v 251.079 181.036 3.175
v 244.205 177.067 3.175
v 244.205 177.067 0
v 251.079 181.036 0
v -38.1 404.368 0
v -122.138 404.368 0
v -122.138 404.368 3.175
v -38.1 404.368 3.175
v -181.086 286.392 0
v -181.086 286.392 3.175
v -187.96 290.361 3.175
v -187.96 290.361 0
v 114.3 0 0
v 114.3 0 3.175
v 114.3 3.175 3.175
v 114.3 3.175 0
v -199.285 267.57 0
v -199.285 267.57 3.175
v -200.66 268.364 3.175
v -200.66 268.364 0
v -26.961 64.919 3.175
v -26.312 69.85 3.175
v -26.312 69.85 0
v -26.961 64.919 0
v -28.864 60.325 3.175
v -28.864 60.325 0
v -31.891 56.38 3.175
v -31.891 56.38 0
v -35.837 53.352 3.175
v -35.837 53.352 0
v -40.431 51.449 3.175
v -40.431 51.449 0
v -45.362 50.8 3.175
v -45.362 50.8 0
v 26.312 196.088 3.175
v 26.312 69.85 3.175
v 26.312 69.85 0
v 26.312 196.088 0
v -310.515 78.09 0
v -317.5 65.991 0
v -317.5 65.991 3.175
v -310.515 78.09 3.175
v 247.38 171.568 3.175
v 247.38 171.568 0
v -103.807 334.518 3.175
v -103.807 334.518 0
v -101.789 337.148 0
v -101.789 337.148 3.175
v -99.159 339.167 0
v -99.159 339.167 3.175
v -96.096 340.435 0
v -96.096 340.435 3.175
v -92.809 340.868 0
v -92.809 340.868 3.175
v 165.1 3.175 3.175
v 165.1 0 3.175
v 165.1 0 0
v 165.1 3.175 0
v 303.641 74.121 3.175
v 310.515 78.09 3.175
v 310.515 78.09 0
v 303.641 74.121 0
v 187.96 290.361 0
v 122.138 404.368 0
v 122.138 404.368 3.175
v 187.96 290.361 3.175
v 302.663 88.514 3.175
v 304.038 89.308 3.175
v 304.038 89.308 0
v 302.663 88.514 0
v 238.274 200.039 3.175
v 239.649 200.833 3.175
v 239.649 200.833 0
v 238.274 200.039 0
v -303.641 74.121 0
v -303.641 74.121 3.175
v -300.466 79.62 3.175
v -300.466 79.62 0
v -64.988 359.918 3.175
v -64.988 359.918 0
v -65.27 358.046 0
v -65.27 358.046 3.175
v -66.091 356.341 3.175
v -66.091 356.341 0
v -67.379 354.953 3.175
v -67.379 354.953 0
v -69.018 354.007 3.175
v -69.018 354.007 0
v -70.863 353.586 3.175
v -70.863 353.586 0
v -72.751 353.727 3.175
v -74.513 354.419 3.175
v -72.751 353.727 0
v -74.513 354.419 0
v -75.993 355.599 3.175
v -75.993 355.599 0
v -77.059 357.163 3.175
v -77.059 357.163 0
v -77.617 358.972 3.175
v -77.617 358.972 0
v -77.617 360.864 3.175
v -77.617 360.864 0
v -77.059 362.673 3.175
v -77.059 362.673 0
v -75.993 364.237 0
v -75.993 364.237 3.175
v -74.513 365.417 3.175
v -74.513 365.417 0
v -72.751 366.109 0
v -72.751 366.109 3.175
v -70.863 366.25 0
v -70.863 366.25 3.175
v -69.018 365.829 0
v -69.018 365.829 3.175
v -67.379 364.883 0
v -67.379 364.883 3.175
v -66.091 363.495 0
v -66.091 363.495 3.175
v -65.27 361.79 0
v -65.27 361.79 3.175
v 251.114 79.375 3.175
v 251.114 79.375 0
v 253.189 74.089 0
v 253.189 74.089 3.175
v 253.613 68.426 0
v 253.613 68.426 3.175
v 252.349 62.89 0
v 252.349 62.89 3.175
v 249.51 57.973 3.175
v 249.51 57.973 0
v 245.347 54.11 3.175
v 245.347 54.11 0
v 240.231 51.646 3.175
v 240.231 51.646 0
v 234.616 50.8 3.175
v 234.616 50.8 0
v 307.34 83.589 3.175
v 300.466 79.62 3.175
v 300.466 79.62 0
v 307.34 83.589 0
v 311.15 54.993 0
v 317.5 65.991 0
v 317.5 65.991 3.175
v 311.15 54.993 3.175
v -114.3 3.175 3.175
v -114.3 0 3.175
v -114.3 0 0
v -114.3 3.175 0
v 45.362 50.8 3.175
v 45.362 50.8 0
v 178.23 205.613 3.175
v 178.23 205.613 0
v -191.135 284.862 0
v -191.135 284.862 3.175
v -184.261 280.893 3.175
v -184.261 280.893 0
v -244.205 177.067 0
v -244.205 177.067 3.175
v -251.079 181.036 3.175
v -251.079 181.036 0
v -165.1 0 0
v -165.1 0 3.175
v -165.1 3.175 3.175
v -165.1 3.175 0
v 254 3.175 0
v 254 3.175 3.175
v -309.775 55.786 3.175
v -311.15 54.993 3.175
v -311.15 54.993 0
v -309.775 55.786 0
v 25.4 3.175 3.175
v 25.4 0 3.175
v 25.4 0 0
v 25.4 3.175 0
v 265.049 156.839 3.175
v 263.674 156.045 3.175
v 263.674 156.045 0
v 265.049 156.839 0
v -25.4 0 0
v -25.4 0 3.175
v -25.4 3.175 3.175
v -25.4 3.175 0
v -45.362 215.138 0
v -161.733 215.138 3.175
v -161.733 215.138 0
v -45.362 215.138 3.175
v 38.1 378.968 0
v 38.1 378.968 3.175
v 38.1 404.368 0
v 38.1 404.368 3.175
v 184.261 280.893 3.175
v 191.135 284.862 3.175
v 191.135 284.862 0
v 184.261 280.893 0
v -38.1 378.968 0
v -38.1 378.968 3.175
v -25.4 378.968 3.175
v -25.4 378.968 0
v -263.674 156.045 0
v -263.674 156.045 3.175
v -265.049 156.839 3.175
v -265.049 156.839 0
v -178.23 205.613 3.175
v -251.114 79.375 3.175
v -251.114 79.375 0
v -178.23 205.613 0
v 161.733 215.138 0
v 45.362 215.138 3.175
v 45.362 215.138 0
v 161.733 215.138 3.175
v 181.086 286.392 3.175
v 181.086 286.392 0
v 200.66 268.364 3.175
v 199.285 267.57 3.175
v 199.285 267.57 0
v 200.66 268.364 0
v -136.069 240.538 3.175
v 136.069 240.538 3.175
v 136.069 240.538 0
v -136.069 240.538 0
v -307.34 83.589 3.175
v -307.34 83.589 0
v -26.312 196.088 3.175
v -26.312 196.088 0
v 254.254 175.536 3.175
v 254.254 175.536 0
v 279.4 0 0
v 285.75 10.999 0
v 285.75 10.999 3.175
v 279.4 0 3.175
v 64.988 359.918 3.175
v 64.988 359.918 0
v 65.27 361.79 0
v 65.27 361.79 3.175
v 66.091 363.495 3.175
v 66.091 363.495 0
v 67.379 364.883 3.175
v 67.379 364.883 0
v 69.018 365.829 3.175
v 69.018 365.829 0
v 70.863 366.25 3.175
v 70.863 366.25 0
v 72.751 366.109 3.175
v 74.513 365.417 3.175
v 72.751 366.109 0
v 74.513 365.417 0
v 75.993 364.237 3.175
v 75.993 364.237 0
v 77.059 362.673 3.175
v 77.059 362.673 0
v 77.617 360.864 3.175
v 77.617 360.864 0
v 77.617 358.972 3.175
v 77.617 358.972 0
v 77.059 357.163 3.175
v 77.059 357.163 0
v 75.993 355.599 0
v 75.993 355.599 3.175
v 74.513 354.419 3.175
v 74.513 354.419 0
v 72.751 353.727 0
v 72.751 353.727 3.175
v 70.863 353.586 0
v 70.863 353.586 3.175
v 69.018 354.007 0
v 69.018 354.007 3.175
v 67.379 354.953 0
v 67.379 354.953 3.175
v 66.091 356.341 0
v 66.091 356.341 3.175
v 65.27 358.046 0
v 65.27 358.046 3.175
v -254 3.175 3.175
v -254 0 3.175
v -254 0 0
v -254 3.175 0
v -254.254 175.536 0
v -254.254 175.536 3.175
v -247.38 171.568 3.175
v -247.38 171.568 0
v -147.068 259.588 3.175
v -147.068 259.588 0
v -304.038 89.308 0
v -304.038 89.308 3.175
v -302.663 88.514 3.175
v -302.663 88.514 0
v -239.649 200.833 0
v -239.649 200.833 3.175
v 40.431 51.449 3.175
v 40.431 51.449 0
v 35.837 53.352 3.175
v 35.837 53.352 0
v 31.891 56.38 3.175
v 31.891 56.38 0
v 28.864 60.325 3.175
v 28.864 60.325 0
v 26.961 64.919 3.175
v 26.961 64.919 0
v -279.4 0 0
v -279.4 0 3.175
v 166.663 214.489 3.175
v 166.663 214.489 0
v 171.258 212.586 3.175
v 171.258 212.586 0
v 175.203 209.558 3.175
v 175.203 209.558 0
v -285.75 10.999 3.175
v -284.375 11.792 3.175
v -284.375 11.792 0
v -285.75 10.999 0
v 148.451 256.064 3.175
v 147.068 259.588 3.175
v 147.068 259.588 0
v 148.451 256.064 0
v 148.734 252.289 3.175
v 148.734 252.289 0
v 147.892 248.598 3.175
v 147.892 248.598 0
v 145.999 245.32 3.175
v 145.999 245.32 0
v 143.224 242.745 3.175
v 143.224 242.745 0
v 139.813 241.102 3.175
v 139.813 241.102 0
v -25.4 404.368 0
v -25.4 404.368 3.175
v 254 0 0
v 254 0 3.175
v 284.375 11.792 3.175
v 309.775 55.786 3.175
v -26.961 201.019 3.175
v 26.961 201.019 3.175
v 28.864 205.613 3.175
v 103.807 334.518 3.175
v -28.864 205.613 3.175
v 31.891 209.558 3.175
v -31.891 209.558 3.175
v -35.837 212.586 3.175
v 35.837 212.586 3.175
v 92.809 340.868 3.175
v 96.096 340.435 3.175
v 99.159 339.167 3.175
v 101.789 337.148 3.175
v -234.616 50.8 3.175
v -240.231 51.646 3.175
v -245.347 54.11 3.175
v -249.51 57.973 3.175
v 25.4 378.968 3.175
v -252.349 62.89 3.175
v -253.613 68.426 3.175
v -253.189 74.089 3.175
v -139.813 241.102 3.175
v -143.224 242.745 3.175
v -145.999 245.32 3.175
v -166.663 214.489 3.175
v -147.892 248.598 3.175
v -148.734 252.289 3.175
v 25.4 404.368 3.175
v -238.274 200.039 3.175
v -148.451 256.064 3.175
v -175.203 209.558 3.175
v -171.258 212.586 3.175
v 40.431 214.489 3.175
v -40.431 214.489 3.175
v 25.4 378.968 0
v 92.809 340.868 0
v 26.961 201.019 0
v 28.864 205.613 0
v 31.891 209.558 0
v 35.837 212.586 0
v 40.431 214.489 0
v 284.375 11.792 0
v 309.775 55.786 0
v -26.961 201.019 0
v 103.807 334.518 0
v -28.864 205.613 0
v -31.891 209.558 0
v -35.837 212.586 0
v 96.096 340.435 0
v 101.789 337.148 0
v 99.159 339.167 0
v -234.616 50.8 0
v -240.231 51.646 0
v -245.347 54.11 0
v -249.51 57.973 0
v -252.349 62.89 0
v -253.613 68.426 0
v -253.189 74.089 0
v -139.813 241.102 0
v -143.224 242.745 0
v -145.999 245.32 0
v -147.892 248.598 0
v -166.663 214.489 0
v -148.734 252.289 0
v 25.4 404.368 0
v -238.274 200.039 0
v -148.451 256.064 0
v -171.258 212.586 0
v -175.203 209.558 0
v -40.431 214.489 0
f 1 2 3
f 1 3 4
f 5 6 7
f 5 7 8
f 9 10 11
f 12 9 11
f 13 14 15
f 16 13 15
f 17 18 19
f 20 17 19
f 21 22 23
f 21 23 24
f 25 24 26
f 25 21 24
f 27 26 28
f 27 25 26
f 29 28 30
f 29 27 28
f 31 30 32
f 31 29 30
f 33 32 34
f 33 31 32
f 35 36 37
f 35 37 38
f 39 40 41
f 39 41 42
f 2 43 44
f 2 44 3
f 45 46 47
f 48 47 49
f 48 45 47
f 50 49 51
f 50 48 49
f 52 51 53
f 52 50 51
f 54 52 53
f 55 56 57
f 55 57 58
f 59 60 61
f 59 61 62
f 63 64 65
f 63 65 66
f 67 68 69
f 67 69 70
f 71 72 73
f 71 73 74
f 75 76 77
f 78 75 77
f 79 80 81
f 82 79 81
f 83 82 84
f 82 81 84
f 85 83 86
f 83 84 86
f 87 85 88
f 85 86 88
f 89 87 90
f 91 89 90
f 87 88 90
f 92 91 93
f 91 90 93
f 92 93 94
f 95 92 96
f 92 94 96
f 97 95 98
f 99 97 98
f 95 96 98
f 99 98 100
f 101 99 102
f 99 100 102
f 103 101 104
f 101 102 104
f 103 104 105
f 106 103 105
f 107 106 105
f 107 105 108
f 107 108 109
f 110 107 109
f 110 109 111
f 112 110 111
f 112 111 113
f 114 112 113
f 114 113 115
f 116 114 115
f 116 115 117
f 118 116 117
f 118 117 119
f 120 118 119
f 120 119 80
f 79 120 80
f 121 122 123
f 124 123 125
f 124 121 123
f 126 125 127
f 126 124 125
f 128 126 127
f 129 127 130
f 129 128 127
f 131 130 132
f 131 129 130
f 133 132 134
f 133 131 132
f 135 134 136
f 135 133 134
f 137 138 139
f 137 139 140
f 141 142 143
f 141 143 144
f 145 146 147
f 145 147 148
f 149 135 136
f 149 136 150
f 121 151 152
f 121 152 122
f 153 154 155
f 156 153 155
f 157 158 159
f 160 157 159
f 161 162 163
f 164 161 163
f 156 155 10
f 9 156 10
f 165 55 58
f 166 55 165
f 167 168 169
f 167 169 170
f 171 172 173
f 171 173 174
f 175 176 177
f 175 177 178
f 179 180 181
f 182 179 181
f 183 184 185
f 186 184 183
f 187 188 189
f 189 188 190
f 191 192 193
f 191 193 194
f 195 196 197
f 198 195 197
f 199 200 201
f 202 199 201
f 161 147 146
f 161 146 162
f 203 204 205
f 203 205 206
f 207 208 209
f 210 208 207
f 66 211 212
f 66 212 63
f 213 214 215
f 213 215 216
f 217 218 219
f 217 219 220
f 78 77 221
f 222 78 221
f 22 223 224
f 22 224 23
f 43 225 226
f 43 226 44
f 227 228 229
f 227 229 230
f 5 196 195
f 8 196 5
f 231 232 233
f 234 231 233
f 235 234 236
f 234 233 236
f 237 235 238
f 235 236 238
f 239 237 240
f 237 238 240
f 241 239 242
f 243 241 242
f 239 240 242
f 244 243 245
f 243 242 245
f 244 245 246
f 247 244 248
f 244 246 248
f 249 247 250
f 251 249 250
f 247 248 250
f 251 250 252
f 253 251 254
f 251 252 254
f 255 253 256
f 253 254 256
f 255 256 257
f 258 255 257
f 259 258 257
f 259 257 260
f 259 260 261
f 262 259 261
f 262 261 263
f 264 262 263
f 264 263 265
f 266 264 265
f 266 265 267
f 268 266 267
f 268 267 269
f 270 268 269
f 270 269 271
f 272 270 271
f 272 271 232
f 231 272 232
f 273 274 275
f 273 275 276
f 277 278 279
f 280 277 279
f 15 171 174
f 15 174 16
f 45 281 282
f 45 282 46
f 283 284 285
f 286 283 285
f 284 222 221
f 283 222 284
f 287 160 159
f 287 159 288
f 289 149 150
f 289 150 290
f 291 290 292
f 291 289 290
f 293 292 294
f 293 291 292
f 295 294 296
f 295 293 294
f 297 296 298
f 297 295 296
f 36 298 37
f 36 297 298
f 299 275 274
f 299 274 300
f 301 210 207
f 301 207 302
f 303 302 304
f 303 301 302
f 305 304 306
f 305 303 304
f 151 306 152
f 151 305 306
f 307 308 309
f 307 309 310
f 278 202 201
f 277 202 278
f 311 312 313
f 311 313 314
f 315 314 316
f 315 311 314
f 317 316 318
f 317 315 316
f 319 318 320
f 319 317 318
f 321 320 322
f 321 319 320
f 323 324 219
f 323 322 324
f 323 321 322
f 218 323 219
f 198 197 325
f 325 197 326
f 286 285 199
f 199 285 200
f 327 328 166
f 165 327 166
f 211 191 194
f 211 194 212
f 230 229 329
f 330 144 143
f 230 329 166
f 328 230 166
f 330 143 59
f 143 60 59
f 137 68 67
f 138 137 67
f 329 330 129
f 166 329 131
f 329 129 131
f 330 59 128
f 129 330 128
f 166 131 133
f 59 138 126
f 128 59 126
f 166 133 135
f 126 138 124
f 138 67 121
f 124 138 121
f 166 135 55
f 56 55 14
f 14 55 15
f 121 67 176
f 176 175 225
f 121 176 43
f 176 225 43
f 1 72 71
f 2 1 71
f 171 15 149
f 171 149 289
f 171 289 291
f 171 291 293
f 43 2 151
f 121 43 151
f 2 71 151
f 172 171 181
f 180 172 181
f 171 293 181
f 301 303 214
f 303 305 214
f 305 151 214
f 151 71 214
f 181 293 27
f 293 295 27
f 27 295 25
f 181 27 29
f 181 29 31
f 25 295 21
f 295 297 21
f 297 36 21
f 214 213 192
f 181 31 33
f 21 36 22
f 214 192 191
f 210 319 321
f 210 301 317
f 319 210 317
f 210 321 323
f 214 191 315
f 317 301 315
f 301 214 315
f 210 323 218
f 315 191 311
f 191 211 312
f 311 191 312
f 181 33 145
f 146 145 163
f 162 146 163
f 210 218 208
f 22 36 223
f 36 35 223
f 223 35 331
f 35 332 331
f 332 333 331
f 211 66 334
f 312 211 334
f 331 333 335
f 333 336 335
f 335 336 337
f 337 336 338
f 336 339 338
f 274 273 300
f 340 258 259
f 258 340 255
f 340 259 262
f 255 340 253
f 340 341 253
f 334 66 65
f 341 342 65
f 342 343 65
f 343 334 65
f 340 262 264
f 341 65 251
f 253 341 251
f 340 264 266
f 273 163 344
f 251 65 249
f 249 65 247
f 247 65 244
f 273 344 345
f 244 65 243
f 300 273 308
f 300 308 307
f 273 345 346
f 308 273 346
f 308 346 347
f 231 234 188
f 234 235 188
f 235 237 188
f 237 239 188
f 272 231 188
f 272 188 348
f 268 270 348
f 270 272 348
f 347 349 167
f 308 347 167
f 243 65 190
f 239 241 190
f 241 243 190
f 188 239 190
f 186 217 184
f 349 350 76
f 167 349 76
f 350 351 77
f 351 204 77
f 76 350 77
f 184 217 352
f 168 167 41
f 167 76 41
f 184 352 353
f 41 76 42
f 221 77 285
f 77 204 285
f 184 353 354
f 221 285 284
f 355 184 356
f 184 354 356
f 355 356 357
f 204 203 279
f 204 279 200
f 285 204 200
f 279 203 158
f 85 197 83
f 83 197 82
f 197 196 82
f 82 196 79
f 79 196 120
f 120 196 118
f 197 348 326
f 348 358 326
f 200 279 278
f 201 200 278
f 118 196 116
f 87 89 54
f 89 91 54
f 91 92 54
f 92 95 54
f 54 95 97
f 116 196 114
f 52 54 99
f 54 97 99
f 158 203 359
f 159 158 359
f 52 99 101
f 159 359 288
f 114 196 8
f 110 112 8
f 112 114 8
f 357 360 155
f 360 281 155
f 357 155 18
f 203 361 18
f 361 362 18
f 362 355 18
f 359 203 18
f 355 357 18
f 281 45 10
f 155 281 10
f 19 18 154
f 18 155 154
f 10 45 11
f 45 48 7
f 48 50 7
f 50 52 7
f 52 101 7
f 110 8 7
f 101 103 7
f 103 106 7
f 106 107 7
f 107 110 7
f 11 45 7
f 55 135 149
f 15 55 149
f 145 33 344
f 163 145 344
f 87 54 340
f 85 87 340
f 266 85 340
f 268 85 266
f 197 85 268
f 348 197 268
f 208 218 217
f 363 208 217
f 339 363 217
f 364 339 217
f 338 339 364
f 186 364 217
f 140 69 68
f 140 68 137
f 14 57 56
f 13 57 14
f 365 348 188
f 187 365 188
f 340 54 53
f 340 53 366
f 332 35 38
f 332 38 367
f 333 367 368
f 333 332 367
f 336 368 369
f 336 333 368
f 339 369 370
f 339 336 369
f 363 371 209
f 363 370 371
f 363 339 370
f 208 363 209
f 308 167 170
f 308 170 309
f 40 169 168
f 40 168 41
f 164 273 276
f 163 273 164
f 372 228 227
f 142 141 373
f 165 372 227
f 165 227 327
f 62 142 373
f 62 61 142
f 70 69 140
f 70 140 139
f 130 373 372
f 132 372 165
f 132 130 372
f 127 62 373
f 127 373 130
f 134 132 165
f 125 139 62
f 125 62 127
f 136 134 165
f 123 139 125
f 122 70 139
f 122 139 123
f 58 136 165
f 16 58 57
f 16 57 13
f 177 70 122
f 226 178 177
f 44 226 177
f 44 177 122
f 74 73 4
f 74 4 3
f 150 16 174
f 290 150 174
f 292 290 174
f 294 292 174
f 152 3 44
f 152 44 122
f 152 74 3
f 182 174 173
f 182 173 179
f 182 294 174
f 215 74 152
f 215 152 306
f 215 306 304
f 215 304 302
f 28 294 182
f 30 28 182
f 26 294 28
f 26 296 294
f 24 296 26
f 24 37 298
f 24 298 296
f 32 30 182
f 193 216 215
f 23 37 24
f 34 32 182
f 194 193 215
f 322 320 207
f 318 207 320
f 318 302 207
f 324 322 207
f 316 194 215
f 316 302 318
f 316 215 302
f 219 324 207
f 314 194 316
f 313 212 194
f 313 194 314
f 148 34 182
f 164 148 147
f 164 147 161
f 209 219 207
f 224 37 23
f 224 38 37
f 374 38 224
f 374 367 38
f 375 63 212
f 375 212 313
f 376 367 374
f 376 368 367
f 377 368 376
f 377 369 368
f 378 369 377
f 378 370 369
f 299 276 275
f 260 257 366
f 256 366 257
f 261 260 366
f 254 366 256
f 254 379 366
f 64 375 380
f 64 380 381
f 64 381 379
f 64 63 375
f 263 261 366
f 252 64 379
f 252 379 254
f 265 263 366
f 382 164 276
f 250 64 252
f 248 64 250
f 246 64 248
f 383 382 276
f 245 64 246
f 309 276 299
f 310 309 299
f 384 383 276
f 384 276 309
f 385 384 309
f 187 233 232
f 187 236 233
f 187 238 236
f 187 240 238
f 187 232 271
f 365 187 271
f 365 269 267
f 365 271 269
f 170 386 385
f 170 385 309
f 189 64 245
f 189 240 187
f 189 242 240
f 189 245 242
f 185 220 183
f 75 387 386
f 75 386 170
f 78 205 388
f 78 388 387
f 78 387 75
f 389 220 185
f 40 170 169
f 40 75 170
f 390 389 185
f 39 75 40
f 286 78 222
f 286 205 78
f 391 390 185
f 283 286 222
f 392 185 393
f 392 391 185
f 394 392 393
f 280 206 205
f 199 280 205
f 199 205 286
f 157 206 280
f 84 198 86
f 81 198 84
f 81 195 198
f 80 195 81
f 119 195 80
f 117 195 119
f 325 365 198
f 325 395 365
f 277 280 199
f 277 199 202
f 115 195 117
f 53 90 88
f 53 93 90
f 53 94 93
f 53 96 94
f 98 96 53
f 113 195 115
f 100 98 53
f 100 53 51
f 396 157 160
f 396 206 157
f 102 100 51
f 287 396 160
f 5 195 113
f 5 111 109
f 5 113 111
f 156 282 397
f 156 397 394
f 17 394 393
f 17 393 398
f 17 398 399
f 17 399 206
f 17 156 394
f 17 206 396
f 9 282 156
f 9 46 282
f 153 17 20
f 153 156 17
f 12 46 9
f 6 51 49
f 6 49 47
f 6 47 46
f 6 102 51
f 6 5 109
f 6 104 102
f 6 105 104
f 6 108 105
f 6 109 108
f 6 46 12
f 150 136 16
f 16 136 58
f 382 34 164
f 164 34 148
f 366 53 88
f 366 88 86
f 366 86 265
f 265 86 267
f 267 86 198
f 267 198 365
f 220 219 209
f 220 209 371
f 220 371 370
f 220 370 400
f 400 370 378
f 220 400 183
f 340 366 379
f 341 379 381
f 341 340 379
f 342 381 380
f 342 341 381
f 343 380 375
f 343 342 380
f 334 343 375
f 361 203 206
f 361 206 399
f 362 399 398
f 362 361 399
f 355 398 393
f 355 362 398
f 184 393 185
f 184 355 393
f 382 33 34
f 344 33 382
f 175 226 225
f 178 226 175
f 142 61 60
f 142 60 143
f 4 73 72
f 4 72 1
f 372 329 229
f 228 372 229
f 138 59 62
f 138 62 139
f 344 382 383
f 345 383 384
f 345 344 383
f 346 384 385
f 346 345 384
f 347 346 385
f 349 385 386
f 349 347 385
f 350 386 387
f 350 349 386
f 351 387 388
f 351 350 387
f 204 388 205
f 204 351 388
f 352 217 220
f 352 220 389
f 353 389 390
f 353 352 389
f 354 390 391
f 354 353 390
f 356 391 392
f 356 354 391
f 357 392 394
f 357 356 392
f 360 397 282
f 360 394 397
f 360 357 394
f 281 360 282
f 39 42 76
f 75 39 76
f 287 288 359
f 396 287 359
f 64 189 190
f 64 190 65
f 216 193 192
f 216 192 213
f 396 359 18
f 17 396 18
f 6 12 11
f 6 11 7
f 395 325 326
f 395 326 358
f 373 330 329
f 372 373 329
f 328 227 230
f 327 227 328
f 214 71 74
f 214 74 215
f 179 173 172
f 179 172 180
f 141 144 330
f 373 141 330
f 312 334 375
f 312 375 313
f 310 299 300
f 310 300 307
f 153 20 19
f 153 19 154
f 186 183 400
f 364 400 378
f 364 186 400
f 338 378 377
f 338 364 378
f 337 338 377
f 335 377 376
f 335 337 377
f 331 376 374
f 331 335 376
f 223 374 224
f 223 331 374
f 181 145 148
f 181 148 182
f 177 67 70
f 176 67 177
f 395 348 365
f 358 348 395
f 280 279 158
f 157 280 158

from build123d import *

# Parameters (mm, degrees)
BOSS_EXTRUDE1_DEPTH = 3.175
SKETCH8_W           = 12.7
SKETCH8_H           = 25.4
CUT_EXTRUDE1_DEPTH  = 515.13014894
SKETCH9_W           = 88.9
SKETCH9_H           = 3.175
CUT_EXTRUDE2_DEPTH  = 515.13014894
CUT_EXTRUDE3_DEPTH  = 515.13014894
CUT_EXTRUDE4_DEPTH  = 515.13014894
CUT_EXTRUDE5_DEPTH  = 515.13014894
CUT_EXTRUDE6_DEPTH  = 515.13014894
CUT_EXTRUDE7_DEPTH  = 515.13014894
SKETCH15_R          = 6.35
CUT_EXTRUDE8_DEPTH  = 515.13014894


with BuildPart() as part:
    # Sketch7 → Boss-Extrude1 (new body)
    with BuildSketch(Plane.XY):
        Polygon((279.4, 0), (-279.4, 0), (-317.5, 65.991135768), (-122.138026348, 404.368), (122.138026348, 404.368), (317.5, 65.991135768), align=None)
    extrude(amount=BOSS_EXTRUDE1_DEPTH)

    # Sketch8 → Cut-Extrude1 (cut, through all)
    with BuildSketch(Plane.XY.offset(3.175)):
        with Locations((-31.75, 391.668)):
            Rectangle(SKETCH8_W, SKETCH8_H)
        with Locations((31.75, 391.668)):
            Rectangle(SKETCH8_W, SKETCH8_H)
    extrude(amount=-CUT_EXTRUDE1_DEPTH, mode=Mode.SUBTRACT)

    # Sketch9 → Cut-Extrude2 (cut, through all)
    with BuildSketch(Plane.XY.offset(3.175)):
        with Locations((-209.55, 1.5875)):
            Rectangle(SKETCH9_W, SKETCH9_H)
        with Locations((-69.85, 1.5875)):
            Rectangle(SKETCH9_W, SKETCH9_H)
        with Locations((69.85, 1.5875)):
            Rectangle(SKETCH9_W, SKETCH9_H)
        with Locations((209.55, 1.5875)):
            Rectangle(SKETCH9_W, SKETCH9_H)
    extrude(amount=-CUT_EXTRUDE2_DEPTH, mode=Mode.SUBTRACT)

    # Sketch10 → Cut-Extrude3 (cut, through all)
    with BuildSketch(Plane.XY.offset(3.175)):
        Polygon((-311.15, 54.99261314), (-309.775184671, 55.78636314), (-284.375184671, 11.792272628), (-285.75, 10.998522628), align=None)
        Polygon((285.75, 10.998522628), (311.15, 54.99261314), (309.775184671, 55.78636314), (284.375184671, 11.792272628), align=None)
    extrude(amount=-CUT_EXTRUDE3_DEPTH, mode=Mode.SUBTRACT)

    # Sketch11 → Cut-Extrude4 (cut, through all)
    with BuildSketch(Plane.XY.offset(3.175)):
        Polygon((-304.038, 89.30800374), (-302.663184671, 88.51425374), (-263.674184671, 156.045182676), (-265.049, 156.838932676), align=None)
        Polygon((-238.274184671, 200.039273188), (-199.285184671, 267.570202125), (-200.66, 268.363952125), (-239.649, 200.833023188), align=None)
        Polygon((304.038, 89.30800374), (302.663184671, 88.51425374), (263.674184671, 156.045182676), (265.049, 156.838932676), align=None)
        Polygon((239.649, 200.833023188), (238.274184671, 200.039273188), (199.285184671, 267.570202125), (200.66, 268.363952125), align=None)
    extrude(amount=-CUT_EXTRUDE4_DEPTH, mode=Mode.SUBTRACT)

    # Sketch12 → Cut-Extrude5 (cut, through all)
    with BuildSketch(Plane.XY.offset(3.175)):
        Polygon((-254.254, 175.536421144), (-247.379923357, 171.567671144), (-244.204923357, 177.066932458), (-251.079, 181.035682458), align=None)
        Polygon((251.079, 181.035682458), (254.254, 175.536421144), (247.379923357, 171.567671144), (244.204923357, 177.066932458), align=None)
        Polygon((-310.515, 78.089510659), (-303.640923357, 74.120760659), (-300.465923357, 79.620021973), (-307.34, 83.588771973), align=None)
        Polygon((-191.135, 284.861736067), (-184.260923357, 280.892986067), (-181.085923357, 286.392247381), (-187.96, 290.360997381), align=None)
        Polygon((307.34, 83.588771973), (310.515, 78.089510659), (303.640923357, 74.120760659), (300.465923357, 79.620021973), align=None)
        Polygon((187.96, 290.360997381), (191.135, 284.861736067), (184.260923357, 280.892986067), (181.085923357, 286.392247381), align=None)
    extrude(amount=-CUT_EXTRUDE5_DEPTH, mode=Mode.SUBTRACT)

    # Sketch13 → Cut-Extrude6 (cut, through all)
    with BuildSketch(Plane.XY.offset(3.175)):
        with BuildLine():
            Line((-92.808632673, 340.868), (92.808632673, 340.868))
            ThreePointArc((92.808632673, 340.868), (99.158632673, 339.166522628), (103.807155302, 334.518))
            Line((103.807155302, 334.518), (147.068010972, 259.588))
            ThreePointArc((147.068010972, 259.588), (147.068010972, 246.888), (136.069488344, 240.538))
            Line((136.069488344, 240.538), (-136.069488344, 240.538))
            ThreePointArc((-136.069488344, 240.538), (-147.068010972, 246.888), (-147.068010972, 259.588))
            Line((-147.068010972, 259.588), (-103.807155302, 334.518))
            ThreePointArc((-103.807155302, 334.518), (-99.158632673, 339.166522628), (-92.808632673, 340.868))
        make_face()
    extrude(amount=-CUT_EXTRUDE6_DEPTH, mode=Mode.SUBTRACT)

    # Sketch14 → Cut-Extrude7 (cut, through all)
    with BuildSketch(Plane.XY.offset(3.175)):
        with BuildLine():
            Line((45.361818975, 215.138), (161.732707809, 215.138))
            ThreePointArc((161.732707809, 215.138), (171.257707809, 212.585783942), (178.230491751, 205.613))
            Line((178.230491751, 205.613), (251.114035033, 79.375))
            ThreePointArc((251.114035033, 79.375), (251.114035033, 60.325), (234.616251091, 50.8))
            Line((234.616251091, 50.8), (45.361818975, 50.8))
            ThreePointArc((45.361818975, 50.8), (31.891434794, 56.379615818), (26.311818975, 69.85))
            Line((26.311818975, 69.85), (26.311818975, 196.088))
            ThreePointArc((26.311818975, 196.088), (31.891434794, 209.558384182), (45.361818975, 215.138))
        make_face()
        with BuildLine():
            Line((-161.732707809, 215.138), (-45.361818975, 215.138))
            ThreePointArc((-45.361818975, 215.138), (-31.891434794, 209.558384182), (-26.311818975, 196.088))
            Line((-26.311818975, 196.088), (-26.311818975, 69.85))
            ThreePointArc((-26.311818975, 69.85), (-31.891434794, 56.379615818), (-45.361818975, 50.8))
            Line((-45.361818975, 50.8), (-234.616251091, 50.8))
            ThreePointArc((-234.616251091, 50.8), (-251.114035033, 60.325), (-251.114035033, 79.375))
            Line((-251.114035033, 79.375), (-178.230491751, 205.613))
            ThreePointArc((-178.230491751, 205.613), (-171.257707809, 212.585783942), (-161.732707809, 215.138))
        make_face()
    extrude(amount=-CUT_EXTRUDE7_DEPTH, mode=Mode.SUBTRACT)

    # Sketch15 → Cut-Extrude8 (cut, through all)
    with BuildSketch(Plane(origin=(0, 0, 0), x_dir=(-1, 0, 0), z_dir=(0, 0, -1))):
        with Locations((-71.338026348, 359.918)):
            Circle(SKETCH15_R)
        with Locations(Location((71.338026348, 359.918, 0), (0, 0, 180))):
            Circle(SKETCH15_R)
    extrude(amount=-CUT_EXTRUDE8_DEPTH, mode=Mode.SUBTRACT)


solid = part.part
